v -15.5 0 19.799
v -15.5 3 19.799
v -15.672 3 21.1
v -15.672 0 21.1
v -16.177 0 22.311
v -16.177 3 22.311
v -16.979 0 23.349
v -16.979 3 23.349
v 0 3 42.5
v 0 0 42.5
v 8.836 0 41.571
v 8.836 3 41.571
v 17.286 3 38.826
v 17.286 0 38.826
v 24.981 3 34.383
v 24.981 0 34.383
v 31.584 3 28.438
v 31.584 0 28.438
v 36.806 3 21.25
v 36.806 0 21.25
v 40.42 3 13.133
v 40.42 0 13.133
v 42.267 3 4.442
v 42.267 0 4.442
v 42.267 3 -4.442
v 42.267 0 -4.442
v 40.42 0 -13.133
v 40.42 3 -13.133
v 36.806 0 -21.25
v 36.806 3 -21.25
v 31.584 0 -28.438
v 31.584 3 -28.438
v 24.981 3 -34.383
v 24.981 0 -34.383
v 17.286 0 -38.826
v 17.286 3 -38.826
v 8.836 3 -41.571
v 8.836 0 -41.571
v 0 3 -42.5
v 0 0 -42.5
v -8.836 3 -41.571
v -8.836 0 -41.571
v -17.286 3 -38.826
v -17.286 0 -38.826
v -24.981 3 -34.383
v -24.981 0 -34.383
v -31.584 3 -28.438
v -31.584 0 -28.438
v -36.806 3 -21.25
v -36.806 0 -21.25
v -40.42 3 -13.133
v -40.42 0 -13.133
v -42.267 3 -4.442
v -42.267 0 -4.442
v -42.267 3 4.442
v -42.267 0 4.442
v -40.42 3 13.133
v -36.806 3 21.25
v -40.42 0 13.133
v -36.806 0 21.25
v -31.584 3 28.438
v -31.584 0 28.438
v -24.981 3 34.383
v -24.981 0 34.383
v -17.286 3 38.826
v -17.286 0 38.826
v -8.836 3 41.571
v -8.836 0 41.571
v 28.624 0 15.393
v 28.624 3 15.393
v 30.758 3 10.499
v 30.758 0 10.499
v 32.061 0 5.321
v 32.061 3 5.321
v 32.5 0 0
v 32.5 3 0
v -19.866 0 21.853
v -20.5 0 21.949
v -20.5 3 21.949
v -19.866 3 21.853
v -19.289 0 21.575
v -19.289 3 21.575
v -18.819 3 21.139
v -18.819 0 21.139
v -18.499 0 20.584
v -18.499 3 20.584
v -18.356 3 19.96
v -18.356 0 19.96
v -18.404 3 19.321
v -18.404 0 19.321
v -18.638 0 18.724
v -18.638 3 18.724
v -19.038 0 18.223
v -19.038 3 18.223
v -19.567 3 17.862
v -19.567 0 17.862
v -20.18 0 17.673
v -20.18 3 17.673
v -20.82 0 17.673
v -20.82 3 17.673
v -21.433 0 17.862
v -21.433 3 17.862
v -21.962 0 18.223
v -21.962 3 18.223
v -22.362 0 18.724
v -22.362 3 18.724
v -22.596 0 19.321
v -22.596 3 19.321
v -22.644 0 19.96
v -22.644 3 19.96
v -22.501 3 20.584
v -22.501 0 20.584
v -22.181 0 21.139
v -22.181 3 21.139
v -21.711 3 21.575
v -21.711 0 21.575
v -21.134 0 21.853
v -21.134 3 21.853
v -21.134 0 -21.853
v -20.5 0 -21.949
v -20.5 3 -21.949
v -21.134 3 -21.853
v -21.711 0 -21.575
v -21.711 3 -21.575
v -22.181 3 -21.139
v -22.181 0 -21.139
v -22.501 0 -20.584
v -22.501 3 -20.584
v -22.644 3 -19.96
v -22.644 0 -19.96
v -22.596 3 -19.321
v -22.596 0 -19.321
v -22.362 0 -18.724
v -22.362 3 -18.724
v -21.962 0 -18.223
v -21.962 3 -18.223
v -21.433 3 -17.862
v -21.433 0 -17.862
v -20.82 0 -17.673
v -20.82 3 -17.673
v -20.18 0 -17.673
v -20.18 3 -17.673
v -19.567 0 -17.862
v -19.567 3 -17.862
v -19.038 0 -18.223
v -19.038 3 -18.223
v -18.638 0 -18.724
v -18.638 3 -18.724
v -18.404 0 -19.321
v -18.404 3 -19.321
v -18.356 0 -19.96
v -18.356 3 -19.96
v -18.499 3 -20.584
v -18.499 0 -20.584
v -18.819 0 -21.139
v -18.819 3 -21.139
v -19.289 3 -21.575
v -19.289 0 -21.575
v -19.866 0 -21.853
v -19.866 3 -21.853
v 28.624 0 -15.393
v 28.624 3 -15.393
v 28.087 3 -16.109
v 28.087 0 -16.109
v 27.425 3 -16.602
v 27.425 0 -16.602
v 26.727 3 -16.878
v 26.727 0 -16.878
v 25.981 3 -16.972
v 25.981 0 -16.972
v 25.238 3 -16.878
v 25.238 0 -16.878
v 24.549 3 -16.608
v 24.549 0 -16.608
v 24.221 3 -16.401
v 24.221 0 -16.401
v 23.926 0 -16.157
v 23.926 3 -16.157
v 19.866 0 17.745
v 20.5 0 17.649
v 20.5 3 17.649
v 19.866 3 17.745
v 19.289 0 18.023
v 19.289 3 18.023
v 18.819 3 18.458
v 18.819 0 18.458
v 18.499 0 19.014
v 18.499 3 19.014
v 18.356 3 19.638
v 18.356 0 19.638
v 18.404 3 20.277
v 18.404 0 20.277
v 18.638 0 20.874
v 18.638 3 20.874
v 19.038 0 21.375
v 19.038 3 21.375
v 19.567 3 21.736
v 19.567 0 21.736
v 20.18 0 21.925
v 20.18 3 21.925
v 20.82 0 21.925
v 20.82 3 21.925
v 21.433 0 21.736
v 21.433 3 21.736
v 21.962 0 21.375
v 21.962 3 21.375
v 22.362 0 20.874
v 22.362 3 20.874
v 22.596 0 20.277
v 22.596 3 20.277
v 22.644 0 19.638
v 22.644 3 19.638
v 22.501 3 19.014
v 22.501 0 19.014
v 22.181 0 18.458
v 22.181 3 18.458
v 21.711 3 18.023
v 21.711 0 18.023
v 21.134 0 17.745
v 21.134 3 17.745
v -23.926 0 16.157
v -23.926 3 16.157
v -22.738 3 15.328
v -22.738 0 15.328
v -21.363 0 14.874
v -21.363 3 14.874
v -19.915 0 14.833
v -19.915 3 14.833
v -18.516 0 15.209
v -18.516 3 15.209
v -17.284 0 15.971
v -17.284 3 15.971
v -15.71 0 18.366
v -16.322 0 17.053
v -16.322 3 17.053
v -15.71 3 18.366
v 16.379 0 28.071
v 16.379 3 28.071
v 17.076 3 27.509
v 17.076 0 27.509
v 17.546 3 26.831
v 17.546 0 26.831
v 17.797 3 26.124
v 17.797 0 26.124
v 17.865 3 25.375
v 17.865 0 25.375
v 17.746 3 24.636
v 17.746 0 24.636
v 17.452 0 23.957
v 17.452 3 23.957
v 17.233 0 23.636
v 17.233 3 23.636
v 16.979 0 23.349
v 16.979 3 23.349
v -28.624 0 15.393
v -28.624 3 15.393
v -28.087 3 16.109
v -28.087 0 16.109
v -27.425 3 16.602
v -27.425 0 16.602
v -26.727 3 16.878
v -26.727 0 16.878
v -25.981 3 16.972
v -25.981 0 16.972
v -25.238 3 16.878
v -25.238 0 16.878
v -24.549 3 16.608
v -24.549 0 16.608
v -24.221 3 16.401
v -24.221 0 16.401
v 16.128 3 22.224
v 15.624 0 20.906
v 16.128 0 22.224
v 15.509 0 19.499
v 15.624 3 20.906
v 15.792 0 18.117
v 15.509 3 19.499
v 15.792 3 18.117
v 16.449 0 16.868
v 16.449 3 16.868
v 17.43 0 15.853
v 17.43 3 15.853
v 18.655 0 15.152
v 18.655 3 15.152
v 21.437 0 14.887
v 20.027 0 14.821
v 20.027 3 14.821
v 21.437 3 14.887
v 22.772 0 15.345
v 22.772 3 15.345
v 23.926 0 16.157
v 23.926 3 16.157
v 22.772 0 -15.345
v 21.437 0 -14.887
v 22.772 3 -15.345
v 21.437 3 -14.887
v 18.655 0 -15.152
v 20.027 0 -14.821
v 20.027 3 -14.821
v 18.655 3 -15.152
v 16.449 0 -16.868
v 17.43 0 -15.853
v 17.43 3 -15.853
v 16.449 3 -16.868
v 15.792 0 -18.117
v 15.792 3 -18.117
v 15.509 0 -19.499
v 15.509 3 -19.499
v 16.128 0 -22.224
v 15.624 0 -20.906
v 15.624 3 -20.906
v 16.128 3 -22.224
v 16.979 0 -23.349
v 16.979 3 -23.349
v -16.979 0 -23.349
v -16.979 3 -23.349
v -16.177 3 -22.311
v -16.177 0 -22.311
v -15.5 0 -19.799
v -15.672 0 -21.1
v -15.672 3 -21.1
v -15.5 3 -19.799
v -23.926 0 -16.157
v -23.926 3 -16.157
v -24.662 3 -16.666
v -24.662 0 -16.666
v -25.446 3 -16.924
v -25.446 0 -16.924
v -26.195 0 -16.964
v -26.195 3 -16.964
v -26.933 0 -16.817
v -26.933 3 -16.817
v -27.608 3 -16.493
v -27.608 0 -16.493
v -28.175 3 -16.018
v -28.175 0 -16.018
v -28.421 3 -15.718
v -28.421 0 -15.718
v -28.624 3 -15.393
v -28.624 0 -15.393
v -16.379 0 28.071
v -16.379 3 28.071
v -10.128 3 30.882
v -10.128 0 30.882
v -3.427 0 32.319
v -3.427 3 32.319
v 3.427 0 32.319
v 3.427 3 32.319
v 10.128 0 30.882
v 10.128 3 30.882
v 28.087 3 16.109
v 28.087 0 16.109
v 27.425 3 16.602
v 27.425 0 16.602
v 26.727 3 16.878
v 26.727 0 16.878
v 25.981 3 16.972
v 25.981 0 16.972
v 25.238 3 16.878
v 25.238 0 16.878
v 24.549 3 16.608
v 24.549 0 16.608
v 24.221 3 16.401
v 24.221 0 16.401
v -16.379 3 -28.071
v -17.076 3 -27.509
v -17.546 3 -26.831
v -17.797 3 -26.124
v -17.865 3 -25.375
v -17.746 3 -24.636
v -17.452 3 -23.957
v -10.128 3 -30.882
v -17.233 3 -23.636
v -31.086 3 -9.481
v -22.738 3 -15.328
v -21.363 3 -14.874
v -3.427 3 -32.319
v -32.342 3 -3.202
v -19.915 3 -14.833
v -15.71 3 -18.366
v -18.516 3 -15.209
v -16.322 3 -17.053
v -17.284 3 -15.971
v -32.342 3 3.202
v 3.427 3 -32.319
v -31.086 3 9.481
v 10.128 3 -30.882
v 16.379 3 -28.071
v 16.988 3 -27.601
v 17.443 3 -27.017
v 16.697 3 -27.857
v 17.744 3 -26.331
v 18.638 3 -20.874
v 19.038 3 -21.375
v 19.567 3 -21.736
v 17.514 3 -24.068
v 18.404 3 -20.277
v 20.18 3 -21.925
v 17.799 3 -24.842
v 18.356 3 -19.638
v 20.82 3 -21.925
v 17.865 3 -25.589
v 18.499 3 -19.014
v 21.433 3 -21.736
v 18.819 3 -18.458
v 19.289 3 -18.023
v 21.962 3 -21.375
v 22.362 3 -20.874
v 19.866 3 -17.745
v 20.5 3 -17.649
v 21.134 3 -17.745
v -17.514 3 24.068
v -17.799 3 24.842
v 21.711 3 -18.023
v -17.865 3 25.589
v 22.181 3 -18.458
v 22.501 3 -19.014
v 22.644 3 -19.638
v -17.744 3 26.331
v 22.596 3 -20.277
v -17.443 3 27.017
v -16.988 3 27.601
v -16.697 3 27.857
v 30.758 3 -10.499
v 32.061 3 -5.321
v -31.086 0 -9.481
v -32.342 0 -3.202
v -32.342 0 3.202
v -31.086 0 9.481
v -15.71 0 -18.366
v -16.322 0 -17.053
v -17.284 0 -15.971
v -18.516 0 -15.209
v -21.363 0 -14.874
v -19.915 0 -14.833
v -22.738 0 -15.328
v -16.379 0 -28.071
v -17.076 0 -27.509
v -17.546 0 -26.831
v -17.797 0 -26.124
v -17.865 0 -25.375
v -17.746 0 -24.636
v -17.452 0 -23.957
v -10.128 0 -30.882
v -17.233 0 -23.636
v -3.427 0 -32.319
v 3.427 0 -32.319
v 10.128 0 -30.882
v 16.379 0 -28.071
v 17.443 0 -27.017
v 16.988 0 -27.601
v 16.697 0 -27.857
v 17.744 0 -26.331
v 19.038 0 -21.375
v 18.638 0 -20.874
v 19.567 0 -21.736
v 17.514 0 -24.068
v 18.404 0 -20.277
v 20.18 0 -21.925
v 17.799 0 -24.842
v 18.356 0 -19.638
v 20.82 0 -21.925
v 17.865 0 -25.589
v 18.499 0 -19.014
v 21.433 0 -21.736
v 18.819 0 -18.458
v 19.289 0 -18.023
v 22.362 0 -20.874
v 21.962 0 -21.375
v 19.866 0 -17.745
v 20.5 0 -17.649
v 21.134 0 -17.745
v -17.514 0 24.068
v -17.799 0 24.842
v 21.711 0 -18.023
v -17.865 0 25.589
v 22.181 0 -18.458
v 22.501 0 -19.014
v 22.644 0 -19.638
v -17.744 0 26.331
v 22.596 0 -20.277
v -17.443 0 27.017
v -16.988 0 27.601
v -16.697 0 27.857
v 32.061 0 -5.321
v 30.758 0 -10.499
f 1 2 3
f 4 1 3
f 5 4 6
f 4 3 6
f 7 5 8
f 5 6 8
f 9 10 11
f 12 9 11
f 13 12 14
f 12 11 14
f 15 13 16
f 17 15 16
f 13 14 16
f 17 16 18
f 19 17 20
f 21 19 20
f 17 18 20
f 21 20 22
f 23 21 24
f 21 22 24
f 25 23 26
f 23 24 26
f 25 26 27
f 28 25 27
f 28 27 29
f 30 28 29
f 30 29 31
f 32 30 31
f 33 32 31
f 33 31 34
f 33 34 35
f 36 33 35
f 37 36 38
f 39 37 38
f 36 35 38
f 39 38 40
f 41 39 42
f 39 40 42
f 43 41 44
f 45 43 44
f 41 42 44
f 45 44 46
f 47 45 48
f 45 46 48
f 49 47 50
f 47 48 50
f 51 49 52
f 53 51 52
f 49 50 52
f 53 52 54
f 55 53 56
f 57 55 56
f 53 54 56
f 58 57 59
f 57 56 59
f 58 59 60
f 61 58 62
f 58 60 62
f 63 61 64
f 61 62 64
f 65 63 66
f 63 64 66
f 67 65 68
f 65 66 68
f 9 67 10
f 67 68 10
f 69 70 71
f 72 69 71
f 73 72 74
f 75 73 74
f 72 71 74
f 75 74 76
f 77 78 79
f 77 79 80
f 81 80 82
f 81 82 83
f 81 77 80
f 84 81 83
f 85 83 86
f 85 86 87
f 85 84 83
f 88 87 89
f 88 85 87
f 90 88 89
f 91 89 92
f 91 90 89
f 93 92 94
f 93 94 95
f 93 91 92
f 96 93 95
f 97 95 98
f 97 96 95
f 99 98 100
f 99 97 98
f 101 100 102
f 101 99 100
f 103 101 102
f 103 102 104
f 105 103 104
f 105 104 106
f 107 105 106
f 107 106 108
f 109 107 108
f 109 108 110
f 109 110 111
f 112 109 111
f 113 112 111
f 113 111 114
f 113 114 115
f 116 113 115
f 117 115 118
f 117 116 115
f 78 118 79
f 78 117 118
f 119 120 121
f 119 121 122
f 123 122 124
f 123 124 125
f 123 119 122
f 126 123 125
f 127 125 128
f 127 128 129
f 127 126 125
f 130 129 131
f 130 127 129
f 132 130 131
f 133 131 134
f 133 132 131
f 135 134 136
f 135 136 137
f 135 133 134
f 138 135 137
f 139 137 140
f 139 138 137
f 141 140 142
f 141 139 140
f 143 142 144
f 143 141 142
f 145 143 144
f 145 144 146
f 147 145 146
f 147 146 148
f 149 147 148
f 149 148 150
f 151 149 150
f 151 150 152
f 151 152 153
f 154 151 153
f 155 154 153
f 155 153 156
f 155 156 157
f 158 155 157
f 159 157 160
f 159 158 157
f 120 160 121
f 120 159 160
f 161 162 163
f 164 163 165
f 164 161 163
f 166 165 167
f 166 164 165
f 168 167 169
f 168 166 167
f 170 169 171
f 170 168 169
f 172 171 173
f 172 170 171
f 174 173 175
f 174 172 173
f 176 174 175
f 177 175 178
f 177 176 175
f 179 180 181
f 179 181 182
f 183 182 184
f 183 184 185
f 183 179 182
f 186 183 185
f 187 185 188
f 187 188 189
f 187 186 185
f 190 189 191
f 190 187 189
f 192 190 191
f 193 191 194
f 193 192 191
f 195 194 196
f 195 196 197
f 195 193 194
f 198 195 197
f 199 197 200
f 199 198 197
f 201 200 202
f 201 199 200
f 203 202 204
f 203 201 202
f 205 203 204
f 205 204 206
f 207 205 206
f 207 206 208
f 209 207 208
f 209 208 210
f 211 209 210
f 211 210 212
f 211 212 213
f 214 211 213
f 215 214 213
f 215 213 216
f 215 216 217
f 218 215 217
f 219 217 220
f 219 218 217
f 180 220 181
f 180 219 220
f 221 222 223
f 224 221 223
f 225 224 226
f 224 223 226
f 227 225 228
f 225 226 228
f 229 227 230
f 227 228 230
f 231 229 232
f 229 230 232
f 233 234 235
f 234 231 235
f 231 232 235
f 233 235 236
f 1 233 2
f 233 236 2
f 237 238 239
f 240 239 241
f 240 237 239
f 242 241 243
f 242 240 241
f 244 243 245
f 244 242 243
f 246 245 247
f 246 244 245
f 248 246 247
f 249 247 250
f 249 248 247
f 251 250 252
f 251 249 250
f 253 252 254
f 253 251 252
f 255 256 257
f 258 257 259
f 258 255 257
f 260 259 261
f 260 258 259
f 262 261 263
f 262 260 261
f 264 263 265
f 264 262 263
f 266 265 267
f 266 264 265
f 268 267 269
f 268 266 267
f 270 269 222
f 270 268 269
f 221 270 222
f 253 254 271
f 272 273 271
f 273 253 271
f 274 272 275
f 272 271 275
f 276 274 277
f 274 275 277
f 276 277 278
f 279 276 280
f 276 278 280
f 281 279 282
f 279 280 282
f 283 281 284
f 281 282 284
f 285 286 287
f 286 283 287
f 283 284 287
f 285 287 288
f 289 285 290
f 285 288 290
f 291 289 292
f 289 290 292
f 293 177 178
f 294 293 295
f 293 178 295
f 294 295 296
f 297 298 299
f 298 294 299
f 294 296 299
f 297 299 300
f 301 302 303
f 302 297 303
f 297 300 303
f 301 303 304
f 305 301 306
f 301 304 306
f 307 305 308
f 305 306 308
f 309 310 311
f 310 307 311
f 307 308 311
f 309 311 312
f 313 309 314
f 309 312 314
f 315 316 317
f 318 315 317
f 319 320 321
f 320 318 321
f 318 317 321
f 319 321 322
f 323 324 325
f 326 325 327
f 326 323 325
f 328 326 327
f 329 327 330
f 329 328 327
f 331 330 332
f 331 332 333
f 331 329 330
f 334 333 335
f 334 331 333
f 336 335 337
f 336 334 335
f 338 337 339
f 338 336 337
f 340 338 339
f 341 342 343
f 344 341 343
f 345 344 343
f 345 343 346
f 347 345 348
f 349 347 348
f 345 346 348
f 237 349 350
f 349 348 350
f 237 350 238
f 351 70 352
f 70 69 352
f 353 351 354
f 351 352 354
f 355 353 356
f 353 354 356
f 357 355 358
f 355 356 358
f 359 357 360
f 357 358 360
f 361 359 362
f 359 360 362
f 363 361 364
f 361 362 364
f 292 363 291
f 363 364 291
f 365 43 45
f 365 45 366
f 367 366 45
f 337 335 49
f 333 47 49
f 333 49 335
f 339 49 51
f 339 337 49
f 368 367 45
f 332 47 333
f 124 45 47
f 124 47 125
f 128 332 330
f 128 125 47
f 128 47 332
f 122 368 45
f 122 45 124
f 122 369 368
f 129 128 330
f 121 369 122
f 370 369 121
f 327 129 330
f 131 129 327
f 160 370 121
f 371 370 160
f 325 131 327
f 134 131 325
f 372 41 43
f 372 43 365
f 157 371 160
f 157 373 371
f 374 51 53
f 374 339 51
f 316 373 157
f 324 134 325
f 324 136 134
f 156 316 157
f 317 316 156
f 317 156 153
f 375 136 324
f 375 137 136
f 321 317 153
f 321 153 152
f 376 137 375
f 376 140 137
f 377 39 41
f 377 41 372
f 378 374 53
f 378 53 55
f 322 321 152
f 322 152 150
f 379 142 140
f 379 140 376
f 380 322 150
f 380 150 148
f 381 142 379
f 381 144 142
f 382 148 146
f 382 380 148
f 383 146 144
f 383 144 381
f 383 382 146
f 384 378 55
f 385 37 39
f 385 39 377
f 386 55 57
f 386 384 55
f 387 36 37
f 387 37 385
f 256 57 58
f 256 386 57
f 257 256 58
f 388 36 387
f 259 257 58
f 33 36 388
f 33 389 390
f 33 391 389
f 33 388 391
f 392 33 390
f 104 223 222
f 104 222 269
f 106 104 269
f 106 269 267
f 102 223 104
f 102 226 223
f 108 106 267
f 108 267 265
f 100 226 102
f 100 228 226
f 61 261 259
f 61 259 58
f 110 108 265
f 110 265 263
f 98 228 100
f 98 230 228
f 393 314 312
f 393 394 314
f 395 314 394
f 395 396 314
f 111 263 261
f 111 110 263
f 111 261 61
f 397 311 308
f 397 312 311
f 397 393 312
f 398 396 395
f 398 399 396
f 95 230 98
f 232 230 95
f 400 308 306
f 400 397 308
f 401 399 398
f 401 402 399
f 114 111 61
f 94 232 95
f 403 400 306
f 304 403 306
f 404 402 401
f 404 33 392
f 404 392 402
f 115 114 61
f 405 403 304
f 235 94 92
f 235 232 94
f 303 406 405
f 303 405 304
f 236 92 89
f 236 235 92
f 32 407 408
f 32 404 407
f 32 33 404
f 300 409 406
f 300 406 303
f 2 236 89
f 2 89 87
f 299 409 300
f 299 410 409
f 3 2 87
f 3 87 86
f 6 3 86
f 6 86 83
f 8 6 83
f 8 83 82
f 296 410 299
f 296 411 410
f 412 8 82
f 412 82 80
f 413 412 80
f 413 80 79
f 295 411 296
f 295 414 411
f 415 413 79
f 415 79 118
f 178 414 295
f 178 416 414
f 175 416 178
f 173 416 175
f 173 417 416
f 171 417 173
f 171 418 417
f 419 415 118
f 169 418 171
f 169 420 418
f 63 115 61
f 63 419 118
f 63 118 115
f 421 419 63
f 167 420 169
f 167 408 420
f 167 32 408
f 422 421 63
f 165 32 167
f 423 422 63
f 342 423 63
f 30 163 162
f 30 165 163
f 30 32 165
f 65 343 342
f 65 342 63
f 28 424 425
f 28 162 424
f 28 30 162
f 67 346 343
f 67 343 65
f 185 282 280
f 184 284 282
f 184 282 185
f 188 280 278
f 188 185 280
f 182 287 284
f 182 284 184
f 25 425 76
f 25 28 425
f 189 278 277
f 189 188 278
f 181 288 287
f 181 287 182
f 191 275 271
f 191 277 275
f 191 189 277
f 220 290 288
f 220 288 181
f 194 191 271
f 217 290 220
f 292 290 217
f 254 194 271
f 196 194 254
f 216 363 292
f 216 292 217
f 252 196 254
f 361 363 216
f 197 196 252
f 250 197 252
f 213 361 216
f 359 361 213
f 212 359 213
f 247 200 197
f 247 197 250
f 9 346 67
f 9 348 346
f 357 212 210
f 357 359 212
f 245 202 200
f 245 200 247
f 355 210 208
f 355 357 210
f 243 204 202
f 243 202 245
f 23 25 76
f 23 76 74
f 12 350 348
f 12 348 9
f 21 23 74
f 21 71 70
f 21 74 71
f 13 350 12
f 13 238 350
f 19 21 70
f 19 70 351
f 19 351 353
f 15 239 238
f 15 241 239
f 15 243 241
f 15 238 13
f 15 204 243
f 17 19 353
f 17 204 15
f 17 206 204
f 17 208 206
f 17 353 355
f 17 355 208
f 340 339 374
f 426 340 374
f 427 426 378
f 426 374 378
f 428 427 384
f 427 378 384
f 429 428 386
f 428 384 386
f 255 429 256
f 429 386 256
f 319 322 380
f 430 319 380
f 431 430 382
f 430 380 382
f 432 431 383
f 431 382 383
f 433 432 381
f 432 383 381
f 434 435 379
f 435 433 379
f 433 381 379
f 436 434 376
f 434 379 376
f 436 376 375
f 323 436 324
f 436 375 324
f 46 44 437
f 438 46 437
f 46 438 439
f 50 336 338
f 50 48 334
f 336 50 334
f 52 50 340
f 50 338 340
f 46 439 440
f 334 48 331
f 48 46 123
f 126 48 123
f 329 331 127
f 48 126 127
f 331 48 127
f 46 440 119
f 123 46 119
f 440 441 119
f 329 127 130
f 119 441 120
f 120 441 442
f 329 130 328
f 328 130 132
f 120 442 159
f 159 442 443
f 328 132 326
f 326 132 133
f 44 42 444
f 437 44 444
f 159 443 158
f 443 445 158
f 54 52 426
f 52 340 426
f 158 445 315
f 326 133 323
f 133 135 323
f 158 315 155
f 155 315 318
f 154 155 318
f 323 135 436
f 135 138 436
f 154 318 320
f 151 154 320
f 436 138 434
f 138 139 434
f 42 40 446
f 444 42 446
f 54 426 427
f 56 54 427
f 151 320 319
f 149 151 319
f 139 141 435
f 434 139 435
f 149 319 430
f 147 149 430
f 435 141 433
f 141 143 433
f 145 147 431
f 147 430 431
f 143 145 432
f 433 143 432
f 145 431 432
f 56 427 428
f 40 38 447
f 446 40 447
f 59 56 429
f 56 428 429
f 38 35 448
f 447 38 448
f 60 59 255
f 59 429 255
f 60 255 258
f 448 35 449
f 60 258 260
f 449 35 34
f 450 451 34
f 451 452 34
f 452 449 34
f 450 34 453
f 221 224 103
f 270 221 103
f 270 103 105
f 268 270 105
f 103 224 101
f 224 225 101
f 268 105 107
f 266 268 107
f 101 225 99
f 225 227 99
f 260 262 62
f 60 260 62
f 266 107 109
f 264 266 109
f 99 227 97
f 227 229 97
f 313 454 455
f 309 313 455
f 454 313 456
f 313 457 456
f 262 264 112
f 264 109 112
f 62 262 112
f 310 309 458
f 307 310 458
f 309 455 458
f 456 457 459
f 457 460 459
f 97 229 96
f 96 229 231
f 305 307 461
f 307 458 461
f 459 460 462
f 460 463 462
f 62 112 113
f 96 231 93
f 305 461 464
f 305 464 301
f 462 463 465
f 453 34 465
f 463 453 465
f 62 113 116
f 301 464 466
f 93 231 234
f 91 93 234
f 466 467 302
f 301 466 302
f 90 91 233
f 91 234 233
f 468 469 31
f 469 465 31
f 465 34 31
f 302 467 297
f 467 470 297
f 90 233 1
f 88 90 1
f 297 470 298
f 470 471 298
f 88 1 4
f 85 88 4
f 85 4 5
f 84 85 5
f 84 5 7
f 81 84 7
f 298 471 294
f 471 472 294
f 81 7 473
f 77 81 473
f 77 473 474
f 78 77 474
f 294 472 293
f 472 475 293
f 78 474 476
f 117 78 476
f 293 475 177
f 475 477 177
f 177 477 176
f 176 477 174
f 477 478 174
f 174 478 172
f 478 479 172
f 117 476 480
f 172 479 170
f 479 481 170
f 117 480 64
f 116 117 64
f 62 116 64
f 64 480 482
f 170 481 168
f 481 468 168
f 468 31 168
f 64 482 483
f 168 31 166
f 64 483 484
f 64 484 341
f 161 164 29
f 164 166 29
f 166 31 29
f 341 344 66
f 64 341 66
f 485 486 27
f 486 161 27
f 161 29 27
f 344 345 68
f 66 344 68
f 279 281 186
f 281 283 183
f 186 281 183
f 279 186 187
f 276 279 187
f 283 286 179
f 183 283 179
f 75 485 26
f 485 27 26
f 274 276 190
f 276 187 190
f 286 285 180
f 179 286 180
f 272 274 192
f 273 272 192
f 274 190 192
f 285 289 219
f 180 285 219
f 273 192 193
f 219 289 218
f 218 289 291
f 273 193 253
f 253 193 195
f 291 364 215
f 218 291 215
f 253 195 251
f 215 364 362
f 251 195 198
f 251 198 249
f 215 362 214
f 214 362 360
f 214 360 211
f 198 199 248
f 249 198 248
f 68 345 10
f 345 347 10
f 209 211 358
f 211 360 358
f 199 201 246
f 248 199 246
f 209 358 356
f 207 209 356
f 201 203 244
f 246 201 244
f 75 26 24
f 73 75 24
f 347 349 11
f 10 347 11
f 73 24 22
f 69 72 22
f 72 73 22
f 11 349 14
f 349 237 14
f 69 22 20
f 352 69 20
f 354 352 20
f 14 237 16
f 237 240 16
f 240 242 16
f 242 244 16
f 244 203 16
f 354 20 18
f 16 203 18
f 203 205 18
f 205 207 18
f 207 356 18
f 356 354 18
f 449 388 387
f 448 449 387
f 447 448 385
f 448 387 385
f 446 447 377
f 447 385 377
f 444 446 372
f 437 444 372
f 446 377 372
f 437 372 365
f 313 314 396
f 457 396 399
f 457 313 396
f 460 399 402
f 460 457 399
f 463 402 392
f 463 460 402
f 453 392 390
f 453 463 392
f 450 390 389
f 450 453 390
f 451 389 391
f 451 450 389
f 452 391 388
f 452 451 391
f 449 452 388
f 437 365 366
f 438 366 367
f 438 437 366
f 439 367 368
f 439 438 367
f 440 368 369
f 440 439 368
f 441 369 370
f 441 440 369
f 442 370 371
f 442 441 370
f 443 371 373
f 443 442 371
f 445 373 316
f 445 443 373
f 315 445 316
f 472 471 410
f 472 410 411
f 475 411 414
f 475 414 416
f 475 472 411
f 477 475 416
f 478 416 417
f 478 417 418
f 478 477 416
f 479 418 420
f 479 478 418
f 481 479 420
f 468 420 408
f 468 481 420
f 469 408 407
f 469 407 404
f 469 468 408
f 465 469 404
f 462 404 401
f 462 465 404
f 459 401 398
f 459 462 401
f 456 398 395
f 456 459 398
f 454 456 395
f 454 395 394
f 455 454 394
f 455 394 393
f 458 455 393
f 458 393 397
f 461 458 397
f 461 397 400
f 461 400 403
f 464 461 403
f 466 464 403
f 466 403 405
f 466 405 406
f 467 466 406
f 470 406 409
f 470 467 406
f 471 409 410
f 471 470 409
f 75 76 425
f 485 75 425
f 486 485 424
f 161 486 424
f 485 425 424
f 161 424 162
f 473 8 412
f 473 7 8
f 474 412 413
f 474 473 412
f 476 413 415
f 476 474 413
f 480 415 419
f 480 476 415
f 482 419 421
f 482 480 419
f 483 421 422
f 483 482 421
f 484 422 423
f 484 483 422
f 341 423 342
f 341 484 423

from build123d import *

# Parameters (mm, degrees)
SKETCH_1_R          = 45
SKETCH_1_R_2        = 2
EXTRUDE_1_DEPTH     = 3
CUT_EXTRUDE_1_DEPTH = 64.710281745
FILLET_1_R          = 3
MOVE_FACE_1_BY      = 2.5
MOVE_FACE_2_BY      = 0.15
MOVE_FACE_2_2_BY    = 0.15
MOVE_FACE_2_3_BY    = 0.15
MOVE_FACE_2_4_BY    = 0.15


with BuildPart() as part:
    # ｽｹｯﾁ1 → ﾎﾞｽ - 押し出し1 (new body)
    with BuildSketch(Plane(origin=(0, 0, 0), x_dir=(1, 0, 0), z_dir=(0, 1, 0))):
        with Locations(Location((0, 0, 0), (0, 0, 270))):
            Circle(SKETCH_1_R)
        with Locations(Location((-20.5, -19.798989873, 0), (0, 0, 270))):
            Circle(SKETCH_1_R_2, mode=Mode.SUBTRACT)
        with Locations(Location((20.5, -19.798989873, 0), (0, 0, 90))):
            Circle(SKETCH_1_R_2, mode=Mode.SUBTRACT)
        with Locations(Location((20.5, 19.798989873, 0), (0, 0, 270))):
            Circle(SKETCH_1_R_2, mode=Mode.SUBTRACT)
        with Locations(Location((-20.5, 19.798989873, 0), (0, 0, 90))):
            Circle(SKETCH_1_R_2, mode=Mode.SUBTRACT)
    extrude(amount=EXTRUDE_1_DEPTH)

    # ｽｹｯﾁ2 → ｶｯﾄ - 押し出し1 (cut, through all)
    with BuildSketch(Plane(origin=(0, 3, 0), x_dir=(1, 0, 0), z_dir=(0, 1, 0))):
        with BuildLine():
            ThreePointArc((25.486471606, -20.166550649), (30.696582279, -10.675665619), (32.5, 0))
            ThreePointArc((32.5, 0), (30.696582279, 10.675665619), (25.486471606, 20.166550649))
            ThreePointArc((25.486471606, 20.166550649), (25.496616757, 19.9828947), (25.5, 19.798989873))
            ThreePointArc((25.5, 19.798989873), (16.778183392, 16.460115641), (21.040767545, 24.769660901))
            ThreePointArc((21.040767545, 24.769660901), (0, 32.5), (-21.040767545, 24.769660901))
            ThreePointArc((-21.040767545, 24.769660901), (-17.161125768, 23.520806481), (-15.5, 19.798989873))
            ThreePointArc((-15.5, 19.798989873), (-20.683904827, 14.802373116), (-25.486471606, 20.166550649))
            ThreePointArc((-25.486471606, 20.166550649), (-32.5, 0), (-25.486471606, -20.166550649))
            ThreePointArc((-25.486471606, -20.166550649), (-20.683904827, -14.802373116), (-15.5, -19.798989873))
            ThreePointArc((-15.5, -19.798989873), (-17.161125768, -23.520806481), (-21.040767545, -24.769660901))
            ThreePointArc((-21.040767545, -24.769660901), (0, -32.5), (21.040767545, -24.769660901))
            ThreePointArc((21.040767545, -24.769660901), (16.778183392, -16.460115641), (25.5, -19.798989873))
            ThreePointArc((25.5, -19.798989873), (25.496616757, -19.9828947), (25.486471606, -20.166550649))
        make_face()
    extrude(amount=-CUT_EXTRUDE_1_DEPTH, mode=Mode.SUBTRACT)

    # ﾌｨﾚｯﾄ1
    fillet_1_edges = [part.edges().sort_by_distance(p)[0] for p in [
        (21.040767545, 1.5, -24.769660901),
        (25.486471606, 1.5, -20.166550649),
        (25.486471606, 1.5, 20.166550649),
        (21.040767545, 1.5, 24.769660901),
        (-21.040767545, 1.5, 24.769660901),
        (-25.486471606, 1.5, 20.166550649),
        (-25.486471606, 1.5, -20.166550649),
        (-21.040767545, 1.5, -24.769660901),
    ]]
    fillet(fillet_1_edges, radius=FILLET_1_R)

    # Move Face 1: a curved face moved inward by 2.5
    add(Solid.thicken(part.faces().sort_by_distance((0, 1.5, -45))[0], -MOVE_FACE_1_BY), mode=Mode.SUBTRACT)

    # Move Face 2: a curved face moved inward by 0.15
    add(Solid.thicken(part.faces().sort_by_distance((20.5, 1.5, -21.798989873))[0], -MOVE_FACE_2_BY), mode=Mode.SUBTRACT)

    # Move Face 2 2: a curved face moved inward by 0.15
    add(Solid.thicken(part.faces().sort_by_distance((-20.5, 1.5, -17.798989873))[0], -MOVE_FACE_2_2_BY), mode=Mode.SUBTRACT)

    # Move Face 2 3: a curved face moved inward by 0.15
    add(Solid.thicken(part.faces().sort_by_distance((-20.5, 1.5, 17.798989873))[0], -MOVE_FACE_2_3_BY), mode=Mode.SUBTRACT)

    # Move Face 2 4: a curved face moved inward by 0.15
    add(Solid.thicken(part.faces().sort_by_distance((20.5, 1.5, 21.798989873))[0], -MOVE_FACE_2_4_BY), mode=Mode.SUBTRACT)


solid = part.part
